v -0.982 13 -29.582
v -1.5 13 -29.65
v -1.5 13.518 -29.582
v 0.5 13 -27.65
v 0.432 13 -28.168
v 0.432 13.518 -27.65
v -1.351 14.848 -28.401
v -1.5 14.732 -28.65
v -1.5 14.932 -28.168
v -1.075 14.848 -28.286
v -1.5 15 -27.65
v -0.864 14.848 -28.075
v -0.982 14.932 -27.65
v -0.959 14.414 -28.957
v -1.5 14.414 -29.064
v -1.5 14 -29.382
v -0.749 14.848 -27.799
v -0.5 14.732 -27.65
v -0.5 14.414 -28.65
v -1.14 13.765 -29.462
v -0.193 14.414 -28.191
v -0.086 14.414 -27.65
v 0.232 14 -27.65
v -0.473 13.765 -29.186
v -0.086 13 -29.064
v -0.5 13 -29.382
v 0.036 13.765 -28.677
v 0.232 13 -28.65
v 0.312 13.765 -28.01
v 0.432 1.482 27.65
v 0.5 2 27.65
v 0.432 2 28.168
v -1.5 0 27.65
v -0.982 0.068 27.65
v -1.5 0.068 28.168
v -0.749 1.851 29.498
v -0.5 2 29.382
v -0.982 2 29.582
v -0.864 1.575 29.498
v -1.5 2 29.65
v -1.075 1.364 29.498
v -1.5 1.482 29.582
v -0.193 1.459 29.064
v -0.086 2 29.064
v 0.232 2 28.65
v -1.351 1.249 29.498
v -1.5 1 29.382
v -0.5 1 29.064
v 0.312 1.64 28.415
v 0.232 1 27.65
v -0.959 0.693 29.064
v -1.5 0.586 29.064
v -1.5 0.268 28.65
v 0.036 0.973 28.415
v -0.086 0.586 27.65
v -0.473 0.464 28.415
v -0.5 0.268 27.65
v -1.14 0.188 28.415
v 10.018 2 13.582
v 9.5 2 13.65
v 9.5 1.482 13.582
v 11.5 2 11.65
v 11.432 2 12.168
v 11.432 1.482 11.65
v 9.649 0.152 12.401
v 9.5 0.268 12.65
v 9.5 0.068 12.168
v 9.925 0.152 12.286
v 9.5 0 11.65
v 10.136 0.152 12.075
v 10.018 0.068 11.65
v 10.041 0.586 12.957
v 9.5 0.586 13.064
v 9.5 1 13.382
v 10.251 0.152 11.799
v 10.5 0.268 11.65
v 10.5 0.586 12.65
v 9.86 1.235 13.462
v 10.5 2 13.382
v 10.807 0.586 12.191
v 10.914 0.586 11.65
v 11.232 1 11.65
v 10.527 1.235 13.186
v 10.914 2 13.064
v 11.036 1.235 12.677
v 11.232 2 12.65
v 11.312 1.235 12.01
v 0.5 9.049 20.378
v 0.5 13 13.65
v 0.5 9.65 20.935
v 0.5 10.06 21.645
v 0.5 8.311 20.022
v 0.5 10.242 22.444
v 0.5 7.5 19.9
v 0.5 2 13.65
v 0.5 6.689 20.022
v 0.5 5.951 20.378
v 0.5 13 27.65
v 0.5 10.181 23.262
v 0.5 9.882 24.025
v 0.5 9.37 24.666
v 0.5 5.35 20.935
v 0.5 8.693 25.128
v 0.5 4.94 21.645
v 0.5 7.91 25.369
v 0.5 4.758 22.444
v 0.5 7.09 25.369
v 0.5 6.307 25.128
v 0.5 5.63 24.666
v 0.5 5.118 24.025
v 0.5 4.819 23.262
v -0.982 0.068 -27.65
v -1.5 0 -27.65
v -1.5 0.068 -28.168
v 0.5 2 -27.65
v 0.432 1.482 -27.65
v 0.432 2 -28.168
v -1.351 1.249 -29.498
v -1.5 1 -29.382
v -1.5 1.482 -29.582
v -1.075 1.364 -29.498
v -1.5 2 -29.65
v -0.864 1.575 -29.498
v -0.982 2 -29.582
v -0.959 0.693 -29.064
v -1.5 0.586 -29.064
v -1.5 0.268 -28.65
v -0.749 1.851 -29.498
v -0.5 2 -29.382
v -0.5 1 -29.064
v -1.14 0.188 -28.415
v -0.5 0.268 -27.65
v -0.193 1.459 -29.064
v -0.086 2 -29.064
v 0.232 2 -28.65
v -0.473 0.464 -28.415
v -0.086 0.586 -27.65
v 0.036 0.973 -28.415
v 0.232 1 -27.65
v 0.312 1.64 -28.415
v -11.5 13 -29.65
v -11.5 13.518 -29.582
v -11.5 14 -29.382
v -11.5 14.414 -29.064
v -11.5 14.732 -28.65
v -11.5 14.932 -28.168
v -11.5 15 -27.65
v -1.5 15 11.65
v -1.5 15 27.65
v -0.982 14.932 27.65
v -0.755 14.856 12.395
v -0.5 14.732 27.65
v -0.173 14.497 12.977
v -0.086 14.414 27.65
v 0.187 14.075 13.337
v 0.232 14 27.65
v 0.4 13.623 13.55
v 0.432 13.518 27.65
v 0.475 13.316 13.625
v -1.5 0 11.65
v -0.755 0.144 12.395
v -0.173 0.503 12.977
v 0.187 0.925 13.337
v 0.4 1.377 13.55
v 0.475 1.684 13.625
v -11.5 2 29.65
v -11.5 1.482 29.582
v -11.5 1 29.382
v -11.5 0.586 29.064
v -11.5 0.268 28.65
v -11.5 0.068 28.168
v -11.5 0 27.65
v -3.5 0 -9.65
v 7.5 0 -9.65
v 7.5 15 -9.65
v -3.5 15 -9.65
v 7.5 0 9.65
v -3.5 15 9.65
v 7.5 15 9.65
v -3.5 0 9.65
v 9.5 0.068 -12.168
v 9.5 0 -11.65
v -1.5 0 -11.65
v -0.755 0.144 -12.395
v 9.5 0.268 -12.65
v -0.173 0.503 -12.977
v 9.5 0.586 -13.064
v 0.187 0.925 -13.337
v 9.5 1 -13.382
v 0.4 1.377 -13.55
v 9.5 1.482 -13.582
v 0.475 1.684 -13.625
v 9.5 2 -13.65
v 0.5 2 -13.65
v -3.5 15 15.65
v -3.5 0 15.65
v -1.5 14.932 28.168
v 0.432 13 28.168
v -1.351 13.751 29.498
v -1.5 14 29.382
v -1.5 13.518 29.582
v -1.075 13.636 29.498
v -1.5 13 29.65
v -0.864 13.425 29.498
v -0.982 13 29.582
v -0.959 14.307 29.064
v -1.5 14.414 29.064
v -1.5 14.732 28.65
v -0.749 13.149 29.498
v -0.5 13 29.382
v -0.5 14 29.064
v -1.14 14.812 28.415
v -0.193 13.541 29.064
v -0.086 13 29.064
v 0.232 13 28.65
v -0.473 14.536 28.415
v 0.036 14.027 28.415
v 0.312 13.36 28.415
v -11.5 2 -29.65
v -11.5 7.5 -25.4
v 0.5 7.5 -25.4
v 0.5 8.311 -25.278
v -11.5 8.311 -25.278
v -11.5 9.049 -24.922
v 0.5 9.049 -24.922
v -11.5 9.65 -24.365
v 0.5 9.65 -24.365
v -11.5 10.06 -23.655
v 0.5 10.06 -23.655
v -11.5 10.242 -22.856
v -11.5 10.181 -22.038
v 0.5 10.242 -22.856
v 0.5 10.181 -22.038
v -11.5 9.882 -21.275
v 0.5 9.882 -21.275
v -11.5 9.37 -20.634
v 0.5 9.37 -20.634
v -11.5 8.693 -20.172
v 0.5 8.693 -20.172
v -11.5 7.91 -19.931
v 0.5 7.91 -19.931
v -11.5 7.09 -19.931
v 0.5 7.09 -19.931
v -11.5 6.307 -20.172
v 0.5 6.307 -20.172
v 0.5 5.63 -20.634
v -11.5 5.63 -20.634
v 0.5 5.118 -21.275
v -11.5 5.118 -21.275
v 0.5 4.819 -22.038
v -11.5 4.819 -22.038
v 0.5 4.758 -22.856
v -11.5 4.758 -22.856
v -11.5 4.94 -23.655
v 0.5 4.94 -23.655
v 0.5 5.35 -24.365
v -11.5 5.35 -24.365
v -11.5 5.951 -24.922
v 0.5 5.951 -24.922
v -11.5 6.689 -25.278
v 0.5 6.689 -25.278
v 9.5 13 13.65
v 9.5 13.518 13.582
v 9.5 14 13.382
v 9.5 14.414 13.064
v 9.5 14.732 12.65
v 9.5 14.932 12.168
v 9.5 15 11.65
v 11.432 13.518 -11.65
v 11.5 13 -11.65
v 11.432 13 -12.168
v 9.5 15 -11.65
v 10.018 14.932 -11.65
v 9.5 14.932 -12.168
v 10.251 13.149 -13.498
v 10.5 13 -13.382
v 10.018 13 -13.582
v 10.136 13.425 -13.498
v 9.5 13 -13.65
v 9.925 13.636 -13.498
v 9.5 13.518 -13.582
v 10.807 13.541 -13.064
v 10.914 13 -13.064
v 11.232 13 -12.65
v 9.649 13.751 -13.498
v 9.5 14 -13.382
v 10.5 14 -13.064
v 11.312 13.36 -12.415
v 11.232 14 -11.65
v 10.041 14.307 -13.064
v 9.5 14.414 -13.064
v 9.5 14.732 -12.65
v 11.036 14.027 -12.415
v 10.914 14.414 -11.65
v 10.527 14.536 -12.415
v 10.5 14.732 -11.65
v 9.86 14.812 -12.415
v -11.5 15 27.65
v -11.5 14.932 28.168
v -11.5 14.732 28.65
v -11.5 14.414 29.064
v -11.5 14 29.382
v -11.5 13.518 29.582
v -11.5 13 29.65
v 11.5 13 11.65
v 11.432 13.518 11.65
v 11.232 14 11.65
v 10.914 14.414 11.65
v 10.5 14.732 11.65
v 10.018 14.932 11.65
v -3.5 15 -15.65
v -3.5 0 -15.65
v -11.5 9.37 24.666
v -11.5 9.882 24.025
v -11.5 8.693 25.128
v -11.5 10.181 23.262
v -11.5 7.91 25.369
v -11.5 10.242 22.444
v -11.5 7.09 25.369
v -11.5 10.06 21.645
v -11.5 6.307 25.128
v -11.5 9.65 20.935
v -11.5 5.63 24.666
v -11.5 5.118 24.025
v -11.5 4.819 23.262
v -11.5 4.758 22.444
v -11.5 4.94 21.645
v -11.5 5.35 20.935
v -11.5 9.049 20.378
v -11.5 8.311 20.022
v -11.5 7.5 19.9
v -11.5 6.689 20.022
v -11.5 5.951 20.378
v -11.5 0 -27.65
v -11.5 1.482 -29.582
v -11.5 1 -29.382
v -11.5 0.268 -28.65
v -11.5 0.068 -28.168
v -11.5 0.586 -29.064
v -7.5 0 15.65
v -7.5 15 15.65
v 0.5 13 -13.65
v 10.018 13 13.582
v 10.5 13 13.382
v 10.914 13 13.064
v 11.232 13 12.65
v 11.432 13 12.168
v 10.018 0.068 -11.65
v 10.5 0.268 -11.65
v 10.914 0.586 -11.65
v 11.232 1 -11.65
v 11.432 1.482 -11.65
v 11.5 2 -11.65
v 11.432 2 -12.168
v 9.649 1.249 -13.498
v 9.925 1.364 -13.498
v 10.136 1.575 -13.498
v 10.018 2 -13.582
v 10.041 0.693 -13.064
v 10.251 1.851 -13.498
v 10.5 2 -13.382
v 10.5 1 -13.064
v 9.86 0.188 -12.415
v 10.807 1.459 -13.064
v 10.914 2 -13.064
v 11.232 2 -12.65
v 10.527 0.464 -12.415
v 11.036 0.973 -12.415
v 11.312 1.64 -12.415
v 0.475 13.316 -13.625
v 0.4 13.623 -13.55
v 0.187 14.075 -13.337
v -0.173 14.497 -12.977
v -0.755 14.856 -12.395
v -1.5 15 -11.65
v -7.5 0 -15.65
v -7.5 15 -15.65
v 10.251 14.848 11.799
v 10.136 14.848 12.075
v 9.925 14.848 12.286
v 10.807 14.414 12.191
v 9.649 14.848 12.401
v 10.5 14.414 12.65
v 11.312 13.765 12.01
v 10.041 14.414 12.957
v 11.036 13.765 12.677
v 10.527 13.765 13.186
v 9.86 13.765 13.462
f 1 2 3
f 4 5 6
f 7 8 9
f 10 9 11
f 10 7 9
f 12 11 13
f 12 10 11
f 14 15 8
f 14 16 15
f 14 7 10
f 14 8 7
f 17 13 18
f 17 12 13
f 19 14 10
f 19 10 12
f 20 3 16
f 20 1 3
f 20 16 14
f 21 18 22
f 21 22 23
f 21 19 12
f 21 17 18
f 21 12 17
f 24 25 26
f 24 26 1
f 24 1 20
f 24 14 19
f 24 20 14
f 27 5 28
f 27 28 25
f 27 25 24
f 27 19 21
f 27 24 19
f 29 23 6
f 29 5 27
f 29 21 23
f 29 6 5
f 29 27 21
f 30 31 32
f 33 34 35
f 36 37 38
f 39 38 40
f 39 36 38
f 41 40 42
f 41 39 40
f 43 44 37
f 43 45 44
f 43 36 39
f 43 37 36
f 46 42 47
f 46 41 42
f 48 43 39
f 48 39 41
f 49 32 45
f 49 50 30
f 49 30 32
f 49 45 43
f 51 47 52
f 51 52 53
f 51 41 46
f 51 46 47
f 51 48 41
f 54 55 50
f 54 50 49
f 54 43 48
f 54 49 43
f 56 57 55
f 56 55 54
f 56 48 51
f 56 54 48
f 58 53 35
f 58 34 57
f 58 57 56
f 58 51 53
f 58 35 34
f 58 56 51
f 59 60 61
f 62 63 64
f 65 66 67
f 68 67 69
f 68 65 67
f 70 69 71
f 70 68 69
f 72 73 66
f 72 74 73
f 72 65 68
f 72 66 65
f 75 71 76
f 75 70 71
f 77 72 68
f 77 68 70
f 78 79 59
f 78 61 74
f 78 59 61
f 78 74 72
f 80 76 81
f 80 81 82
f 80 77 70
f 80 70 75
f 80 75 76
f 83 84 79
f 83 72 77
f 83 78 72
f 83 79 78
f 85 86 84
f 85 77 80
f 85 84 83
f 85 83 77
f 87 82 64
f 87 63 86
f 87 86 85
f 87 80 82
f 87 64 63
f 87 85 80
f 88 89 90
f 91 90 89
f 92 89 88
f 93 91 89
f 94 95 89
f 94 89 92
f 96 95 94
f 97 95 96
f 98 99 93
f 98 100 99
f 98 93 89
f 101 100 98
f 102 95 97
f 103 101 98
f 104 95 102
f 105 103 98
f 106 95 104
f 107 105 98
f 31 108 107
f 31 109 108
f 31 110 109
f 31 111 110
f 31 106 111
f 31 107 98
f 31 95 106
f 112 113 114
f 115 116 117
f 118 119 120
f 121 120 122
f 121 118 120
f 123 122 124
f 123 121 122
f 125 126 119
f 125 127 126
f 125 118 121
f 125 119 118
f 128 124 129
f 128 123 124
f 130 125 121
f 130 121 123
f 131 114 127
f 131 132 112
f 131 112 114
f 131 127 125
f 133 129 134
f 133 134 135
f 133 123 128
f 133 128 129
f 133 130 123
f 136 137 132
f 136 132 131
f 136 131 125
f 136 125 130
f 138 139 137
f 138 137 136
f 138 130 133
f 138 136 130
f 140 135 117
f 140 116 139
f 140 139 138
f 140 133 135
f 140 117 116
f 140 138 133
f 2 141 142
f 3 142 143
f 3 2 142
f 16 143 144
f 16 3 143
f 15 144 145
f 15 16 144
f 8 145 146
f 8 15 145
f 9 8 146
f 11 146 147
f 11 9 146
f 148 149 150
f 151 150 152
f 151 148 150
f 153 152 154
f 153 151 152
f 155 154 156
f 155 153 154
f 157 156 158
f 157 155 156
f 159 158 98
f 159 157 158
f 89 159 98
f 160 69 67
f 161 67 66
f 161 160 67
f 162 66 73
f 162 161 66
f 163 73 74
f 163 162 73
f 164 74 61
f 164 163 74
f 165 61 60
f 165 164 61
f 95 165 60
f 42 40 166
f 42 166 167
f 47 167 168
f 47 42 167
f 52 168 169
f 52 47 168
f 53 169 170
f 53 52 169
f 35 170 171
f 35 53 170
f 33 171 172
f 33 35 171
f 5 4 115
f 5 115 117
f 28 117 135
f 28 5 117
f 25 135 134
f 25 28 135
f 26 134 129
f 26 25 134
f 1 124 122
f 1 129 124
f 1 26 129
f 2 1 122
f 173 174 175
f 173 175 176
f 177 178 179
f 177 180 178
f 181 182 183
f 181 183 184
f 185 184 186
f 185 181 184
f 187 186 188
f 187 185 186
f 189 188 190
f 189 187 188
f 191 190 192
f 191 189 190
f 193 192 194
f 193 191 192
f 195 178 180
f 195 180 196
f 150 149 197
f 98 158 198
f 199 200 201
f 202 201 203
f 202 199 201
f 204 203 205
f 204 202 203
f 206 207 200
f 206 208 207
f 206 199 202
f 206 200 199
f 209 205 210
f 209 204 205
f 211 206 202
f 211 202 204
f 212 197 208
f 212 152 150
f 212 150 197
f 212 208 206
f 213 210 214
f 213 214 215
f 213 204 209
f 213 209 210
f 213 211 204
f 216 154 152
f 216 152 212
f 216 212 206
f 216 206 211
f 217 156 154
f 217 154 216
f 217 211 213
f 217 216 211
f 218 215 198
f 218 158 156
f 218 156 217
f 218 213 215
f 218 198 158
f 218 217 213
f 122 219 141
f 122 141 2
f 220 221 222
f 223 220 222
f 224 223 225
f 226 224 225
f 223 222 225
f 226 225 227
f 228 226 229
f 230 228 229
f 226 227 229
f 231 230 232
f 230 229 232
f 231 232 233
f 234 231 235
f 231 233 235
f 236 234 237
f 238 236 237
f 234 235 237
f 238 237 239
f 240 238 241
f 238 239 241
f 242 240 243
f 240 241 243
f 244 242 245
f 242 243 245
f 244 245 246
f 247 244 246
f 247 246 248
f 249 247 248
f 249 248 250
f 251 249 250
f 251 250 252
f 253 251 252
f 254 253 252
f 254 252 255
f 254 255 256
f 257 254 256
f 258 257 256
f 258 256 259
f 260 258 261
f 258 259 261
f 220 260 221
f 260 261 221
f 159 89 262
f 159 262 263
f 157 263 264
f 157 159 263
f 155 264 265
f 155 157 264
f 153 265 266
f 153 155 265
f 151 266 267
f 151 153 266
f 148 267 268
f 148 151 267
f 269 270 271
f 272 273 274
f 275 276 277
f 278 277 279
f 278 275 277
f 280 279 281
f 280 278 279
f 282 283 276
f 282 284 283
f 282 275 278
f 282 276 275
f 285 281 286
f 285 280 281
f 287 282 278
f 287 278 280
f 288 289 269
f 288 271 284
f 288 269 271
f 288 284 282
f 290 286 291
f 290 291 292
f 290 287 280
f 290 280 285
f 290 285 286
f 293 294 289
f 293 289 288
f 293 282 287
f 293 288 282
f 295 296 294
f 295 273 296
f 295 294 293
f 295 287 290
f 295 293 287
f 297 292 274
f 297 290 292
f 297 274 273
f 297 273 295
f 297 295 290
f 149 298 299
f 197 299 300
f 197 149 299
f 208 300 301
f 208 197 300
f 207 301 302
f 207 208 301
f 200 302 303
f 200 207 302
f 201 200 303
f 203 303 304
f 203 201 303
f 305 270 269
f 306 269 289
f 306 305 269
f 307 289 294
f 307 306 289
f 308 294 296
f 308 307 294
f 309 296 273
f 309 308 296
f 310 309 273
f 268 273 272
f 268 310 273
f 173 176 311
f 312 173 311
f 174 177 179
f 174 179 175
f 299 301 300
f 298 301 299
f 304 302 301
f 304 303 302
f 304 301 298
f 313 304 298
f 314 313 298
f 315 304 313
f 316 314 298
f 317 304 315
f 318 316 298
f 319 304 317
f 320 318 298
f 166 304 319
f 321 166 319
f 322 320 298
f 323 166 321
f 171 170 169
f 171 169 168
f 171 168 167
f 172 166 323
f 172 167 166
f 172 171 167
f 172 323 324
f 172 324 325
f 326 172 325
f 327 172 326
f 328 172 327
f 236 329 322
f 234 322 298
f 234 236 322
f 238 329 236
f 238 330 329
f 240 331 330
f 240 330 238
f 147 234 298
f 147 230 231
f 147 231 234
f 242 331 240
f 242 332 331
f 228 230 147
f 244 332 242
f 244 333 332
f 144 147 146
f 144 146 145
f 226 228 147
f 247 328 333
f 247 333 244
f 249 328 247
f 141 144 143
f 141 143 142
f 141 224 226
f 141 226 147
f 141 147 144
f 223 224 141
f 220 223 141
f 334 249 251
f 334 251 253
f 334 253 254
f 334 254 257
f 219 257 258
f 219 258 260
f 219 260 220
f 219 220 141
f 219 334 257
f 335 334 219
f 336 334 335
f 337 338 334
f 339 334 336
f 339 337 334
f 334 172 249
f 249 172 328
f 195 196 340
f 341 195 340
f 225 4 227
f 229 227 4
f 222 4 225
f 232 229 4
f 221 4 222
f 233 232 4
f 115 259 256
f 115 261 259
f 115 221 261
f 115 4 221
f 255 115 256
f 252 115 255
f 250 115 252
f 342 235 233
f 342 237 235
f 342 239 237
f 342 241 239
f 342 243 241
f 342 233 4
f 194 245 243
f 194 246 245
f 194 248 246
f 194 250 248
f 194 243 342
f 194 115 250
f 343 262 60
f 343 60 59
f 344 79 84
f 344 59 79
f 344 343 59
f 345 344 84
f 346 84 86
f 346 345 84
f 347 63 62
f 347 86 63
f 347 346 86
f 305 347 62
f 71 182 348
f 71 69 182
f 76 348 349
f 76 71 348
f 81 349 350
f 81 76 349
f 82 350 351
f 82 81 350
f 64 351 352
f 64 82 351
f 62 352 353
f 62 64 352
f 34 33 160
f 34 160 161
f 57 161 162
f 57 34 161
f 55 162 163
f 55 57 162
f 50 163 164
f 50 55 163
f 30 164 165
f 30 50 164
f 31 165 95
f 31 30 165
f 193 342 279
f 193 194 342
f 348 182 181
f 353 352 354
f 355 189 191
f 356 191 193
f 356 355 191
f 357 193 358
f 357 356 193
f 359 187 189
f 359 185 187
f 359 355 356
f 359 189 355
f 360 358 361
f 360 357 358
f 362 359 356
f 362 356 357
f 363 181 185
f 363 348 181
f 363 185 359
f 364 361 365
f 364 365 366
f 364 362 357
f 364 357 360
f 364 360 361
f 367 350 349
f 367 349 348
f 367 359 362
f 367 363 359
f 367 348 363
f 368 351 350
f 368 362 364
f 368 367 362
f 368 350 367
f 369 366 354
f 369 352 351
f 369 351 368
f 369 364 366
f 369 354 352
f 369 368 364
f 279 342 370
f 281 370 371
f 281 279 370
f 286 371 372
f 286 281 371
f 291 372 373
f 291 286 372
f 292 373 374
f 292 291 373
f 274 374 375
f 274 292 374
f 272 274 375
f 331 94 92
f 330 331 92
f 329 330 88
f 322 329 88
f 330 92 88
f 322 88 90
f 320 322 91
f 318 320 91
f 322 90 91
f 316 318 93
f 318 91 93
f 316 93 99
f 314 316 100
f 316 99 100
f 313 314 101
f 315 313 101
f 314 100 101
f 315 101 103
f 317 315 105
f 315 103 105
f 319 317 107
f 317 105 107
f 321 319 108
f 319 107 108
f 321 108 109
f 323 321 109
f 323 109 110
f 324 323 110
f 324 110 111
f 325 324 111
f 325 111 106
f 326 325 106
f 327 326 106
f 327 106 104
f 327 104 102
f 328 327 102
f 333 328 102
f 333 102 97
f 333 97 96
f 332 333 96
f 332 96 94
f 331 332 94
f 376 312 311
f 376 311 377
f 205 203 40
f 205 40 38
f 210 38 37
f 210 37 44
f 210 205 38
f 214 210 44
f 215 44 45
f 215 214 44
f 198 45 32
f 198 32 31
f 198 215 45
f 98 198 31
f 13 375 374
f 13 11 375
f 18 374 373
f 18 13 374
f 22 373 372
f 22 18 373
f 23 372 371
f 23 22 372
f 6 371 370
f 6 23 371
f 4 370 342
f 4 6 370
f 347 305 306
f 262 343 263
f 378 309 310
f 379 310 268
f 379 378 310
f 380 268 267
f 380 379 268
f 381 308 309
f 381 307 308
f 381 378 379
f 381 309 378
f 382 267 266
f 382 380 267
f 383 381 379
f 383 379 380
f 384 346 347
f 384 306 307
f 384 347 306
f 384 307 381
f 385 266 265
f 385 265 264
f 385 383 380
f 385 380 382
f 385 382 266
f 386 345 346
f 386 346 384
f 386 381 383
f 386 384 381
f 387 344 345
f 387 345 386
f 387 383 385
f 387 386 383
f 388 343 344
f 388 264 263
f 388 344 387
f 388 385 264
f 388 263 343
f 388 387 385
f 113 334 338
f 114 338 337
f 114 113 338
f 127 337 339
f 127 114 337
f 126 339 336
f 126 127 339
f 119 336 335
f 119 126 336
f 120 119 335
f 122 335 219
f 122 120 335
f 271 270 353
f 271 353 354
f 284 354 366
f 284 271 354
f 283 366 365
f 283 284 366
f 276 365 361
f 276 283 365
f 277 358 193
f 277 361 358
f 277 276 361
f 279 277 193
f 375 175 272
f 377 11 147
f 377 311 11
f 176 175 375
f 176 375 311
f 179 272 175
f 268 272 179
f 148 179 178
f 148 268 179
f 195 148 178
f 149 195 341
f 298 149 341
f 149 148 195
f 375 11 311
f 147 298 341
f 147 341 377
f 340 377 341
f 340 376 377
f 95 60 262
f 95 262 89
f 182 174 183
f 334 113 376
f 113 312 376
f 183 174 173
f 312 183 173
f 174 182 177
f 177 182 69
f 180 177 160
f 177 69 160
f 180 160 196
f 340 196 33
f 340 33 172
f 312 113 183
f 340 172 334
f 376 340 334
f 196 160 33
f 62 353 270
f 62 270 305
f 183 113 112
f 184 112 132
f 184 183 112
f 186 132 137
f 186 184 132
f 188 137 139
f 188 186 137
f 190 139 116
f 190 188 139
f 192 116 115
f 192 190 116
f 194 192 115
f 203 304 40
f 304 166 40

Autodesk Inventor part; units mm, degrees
ref_plane "YZ Plane" through (0, 0, 0) normal (1, 0, 0) x (0, 1, 0)
ref_plane "XZ Plane" through (0, 0, 0) normal (0, 1, 0) x (-1, 0, 0)
ref_plane "XY Plane" through (0, 0, 0) normal (0, 0, 1) x (1, 0, 0)
sketch "Sketch1" plane through (0, 0, 0) normal (0, 1, 0) x (-1, 0, 0)
  line L0 (3.5, 9.65) -> (-7.5, 9.65)
  line L1 (-7.5, 9.65) -> (-7.5, -9.65)
  line L2 (-7.5, -9.65) -> (3.5, -9.65)
  line L3 (7.5, -9.65) -> (7.5, 9.65)
  line L4 (7.5, 9.65) -> (-7.5, -9.65) construction
  line L5 (-7.5, 9.65) -> (7.5, -9.65) construction
  line L6 (3.5, 9.65) -> (3.5, 15.65)
  line L7 (3.5, 15.65) -> (7.5, 15.65)
  line L8 (7.5, 15.65) -> (7.5, 9.65)
  line L9 (-7.5, 0) -> (7.5, 0) construction
  line L10 (3.5, -9.65) -> (3.5, -15.65)
  line L11 (3.5, -15.65) -> (7.5, -15.65)
  line L12 (7.5, -15.65) -> (7.5, -9.65)
  line L13 (11.5, 9.65) -> (11.5, -9.65)
  line L14 (11.5, -9.65) -> (11.5, -19.65)
  line L15 (-0.5, -19.65) -> (-0.5, -13.65)
  line L16 (-0.5, -13.65) -> (-11.5, -13.65)
  line L17 (-11.5, -13.65) -> (-11.5, 13.65)
  line L18 (-11.5, 13.65) -> (-0.5, 13.65)
  line L19 (-0.5, 13.65) -> (-0.5, 19.65)
  line L20 (11.5, 19.65) -> (11.5, 9.65)
  line L21 (11.5, 19.65) -> (11.5, 29.65)
  line L22 (11.5, 29.65) -> (-0.5, 29.65)
  line L23 (-0.5, 29.65) -> (-0.5, 19.65)
  line L24 (11.5, -19.65) -> (11.5, -29.65)
  line L25 (11.5, -29.65) -> (-0.5, -29.65)
  line L26 (-0.5, -29.65) -> (-0.5, -19.65)
  point P0 (0, 0)
  dimension "d0" = 15
  dimension "d1" = 19.3
  dimension "d2" = 4
  dimension "d3" = 6
  dimension "d4" = 4
  dimension "d5" = 10
extrude "Extrusion1" add sketch "Sketch1" along normal blind 15
sketch "Sketch2" plane through (0.5, 0, 29.65) normal (1, 0, 0) x (0, 0, -1)
  line L0 (0, 0) -> (0, 15) construction
  line L1 (0, 7.5) -> (7, 7.5) construction
  circle A0 centre (7, 7.5) radius 2.75
  line L2 (29.65, 0) -> (29.65, 27.4912) construction
  line L3 (59.3, 7.5) -> (52.3, 7.5) construction
  circle A1 centre (52.3, 7.5) radius 2.75
  dimension "d8" = 7
  dimension "d9" = 5.5
extrude "Extrusion2" cut sketch "Sketch2" against normal blind 15
fillet "Fillet1" radius 2 18 edges at (11.5, 7.5, 13.65) (11.5, 15, 0) (6, 15, 13.65) (11.5, 0, 0) (11.5, 7.5, -13.65) (6, 0, -13.65) (6, 0, 13.65) (0.5, 15, 21.65) (0.5, 0, 21.65) (0.5, 7.5, 29.65) (0.5, 0, -21.65) (0.5, 7.5, -29.65) (0.5, 15, -21.65) (-5.5, 0, -29.65) (-5.5, 15, 29.65) (-5.5, 0, 29.65) (-5.5, 15, -29.65) (6, 15, -13.65)
properties part number "actuator_mounting"
